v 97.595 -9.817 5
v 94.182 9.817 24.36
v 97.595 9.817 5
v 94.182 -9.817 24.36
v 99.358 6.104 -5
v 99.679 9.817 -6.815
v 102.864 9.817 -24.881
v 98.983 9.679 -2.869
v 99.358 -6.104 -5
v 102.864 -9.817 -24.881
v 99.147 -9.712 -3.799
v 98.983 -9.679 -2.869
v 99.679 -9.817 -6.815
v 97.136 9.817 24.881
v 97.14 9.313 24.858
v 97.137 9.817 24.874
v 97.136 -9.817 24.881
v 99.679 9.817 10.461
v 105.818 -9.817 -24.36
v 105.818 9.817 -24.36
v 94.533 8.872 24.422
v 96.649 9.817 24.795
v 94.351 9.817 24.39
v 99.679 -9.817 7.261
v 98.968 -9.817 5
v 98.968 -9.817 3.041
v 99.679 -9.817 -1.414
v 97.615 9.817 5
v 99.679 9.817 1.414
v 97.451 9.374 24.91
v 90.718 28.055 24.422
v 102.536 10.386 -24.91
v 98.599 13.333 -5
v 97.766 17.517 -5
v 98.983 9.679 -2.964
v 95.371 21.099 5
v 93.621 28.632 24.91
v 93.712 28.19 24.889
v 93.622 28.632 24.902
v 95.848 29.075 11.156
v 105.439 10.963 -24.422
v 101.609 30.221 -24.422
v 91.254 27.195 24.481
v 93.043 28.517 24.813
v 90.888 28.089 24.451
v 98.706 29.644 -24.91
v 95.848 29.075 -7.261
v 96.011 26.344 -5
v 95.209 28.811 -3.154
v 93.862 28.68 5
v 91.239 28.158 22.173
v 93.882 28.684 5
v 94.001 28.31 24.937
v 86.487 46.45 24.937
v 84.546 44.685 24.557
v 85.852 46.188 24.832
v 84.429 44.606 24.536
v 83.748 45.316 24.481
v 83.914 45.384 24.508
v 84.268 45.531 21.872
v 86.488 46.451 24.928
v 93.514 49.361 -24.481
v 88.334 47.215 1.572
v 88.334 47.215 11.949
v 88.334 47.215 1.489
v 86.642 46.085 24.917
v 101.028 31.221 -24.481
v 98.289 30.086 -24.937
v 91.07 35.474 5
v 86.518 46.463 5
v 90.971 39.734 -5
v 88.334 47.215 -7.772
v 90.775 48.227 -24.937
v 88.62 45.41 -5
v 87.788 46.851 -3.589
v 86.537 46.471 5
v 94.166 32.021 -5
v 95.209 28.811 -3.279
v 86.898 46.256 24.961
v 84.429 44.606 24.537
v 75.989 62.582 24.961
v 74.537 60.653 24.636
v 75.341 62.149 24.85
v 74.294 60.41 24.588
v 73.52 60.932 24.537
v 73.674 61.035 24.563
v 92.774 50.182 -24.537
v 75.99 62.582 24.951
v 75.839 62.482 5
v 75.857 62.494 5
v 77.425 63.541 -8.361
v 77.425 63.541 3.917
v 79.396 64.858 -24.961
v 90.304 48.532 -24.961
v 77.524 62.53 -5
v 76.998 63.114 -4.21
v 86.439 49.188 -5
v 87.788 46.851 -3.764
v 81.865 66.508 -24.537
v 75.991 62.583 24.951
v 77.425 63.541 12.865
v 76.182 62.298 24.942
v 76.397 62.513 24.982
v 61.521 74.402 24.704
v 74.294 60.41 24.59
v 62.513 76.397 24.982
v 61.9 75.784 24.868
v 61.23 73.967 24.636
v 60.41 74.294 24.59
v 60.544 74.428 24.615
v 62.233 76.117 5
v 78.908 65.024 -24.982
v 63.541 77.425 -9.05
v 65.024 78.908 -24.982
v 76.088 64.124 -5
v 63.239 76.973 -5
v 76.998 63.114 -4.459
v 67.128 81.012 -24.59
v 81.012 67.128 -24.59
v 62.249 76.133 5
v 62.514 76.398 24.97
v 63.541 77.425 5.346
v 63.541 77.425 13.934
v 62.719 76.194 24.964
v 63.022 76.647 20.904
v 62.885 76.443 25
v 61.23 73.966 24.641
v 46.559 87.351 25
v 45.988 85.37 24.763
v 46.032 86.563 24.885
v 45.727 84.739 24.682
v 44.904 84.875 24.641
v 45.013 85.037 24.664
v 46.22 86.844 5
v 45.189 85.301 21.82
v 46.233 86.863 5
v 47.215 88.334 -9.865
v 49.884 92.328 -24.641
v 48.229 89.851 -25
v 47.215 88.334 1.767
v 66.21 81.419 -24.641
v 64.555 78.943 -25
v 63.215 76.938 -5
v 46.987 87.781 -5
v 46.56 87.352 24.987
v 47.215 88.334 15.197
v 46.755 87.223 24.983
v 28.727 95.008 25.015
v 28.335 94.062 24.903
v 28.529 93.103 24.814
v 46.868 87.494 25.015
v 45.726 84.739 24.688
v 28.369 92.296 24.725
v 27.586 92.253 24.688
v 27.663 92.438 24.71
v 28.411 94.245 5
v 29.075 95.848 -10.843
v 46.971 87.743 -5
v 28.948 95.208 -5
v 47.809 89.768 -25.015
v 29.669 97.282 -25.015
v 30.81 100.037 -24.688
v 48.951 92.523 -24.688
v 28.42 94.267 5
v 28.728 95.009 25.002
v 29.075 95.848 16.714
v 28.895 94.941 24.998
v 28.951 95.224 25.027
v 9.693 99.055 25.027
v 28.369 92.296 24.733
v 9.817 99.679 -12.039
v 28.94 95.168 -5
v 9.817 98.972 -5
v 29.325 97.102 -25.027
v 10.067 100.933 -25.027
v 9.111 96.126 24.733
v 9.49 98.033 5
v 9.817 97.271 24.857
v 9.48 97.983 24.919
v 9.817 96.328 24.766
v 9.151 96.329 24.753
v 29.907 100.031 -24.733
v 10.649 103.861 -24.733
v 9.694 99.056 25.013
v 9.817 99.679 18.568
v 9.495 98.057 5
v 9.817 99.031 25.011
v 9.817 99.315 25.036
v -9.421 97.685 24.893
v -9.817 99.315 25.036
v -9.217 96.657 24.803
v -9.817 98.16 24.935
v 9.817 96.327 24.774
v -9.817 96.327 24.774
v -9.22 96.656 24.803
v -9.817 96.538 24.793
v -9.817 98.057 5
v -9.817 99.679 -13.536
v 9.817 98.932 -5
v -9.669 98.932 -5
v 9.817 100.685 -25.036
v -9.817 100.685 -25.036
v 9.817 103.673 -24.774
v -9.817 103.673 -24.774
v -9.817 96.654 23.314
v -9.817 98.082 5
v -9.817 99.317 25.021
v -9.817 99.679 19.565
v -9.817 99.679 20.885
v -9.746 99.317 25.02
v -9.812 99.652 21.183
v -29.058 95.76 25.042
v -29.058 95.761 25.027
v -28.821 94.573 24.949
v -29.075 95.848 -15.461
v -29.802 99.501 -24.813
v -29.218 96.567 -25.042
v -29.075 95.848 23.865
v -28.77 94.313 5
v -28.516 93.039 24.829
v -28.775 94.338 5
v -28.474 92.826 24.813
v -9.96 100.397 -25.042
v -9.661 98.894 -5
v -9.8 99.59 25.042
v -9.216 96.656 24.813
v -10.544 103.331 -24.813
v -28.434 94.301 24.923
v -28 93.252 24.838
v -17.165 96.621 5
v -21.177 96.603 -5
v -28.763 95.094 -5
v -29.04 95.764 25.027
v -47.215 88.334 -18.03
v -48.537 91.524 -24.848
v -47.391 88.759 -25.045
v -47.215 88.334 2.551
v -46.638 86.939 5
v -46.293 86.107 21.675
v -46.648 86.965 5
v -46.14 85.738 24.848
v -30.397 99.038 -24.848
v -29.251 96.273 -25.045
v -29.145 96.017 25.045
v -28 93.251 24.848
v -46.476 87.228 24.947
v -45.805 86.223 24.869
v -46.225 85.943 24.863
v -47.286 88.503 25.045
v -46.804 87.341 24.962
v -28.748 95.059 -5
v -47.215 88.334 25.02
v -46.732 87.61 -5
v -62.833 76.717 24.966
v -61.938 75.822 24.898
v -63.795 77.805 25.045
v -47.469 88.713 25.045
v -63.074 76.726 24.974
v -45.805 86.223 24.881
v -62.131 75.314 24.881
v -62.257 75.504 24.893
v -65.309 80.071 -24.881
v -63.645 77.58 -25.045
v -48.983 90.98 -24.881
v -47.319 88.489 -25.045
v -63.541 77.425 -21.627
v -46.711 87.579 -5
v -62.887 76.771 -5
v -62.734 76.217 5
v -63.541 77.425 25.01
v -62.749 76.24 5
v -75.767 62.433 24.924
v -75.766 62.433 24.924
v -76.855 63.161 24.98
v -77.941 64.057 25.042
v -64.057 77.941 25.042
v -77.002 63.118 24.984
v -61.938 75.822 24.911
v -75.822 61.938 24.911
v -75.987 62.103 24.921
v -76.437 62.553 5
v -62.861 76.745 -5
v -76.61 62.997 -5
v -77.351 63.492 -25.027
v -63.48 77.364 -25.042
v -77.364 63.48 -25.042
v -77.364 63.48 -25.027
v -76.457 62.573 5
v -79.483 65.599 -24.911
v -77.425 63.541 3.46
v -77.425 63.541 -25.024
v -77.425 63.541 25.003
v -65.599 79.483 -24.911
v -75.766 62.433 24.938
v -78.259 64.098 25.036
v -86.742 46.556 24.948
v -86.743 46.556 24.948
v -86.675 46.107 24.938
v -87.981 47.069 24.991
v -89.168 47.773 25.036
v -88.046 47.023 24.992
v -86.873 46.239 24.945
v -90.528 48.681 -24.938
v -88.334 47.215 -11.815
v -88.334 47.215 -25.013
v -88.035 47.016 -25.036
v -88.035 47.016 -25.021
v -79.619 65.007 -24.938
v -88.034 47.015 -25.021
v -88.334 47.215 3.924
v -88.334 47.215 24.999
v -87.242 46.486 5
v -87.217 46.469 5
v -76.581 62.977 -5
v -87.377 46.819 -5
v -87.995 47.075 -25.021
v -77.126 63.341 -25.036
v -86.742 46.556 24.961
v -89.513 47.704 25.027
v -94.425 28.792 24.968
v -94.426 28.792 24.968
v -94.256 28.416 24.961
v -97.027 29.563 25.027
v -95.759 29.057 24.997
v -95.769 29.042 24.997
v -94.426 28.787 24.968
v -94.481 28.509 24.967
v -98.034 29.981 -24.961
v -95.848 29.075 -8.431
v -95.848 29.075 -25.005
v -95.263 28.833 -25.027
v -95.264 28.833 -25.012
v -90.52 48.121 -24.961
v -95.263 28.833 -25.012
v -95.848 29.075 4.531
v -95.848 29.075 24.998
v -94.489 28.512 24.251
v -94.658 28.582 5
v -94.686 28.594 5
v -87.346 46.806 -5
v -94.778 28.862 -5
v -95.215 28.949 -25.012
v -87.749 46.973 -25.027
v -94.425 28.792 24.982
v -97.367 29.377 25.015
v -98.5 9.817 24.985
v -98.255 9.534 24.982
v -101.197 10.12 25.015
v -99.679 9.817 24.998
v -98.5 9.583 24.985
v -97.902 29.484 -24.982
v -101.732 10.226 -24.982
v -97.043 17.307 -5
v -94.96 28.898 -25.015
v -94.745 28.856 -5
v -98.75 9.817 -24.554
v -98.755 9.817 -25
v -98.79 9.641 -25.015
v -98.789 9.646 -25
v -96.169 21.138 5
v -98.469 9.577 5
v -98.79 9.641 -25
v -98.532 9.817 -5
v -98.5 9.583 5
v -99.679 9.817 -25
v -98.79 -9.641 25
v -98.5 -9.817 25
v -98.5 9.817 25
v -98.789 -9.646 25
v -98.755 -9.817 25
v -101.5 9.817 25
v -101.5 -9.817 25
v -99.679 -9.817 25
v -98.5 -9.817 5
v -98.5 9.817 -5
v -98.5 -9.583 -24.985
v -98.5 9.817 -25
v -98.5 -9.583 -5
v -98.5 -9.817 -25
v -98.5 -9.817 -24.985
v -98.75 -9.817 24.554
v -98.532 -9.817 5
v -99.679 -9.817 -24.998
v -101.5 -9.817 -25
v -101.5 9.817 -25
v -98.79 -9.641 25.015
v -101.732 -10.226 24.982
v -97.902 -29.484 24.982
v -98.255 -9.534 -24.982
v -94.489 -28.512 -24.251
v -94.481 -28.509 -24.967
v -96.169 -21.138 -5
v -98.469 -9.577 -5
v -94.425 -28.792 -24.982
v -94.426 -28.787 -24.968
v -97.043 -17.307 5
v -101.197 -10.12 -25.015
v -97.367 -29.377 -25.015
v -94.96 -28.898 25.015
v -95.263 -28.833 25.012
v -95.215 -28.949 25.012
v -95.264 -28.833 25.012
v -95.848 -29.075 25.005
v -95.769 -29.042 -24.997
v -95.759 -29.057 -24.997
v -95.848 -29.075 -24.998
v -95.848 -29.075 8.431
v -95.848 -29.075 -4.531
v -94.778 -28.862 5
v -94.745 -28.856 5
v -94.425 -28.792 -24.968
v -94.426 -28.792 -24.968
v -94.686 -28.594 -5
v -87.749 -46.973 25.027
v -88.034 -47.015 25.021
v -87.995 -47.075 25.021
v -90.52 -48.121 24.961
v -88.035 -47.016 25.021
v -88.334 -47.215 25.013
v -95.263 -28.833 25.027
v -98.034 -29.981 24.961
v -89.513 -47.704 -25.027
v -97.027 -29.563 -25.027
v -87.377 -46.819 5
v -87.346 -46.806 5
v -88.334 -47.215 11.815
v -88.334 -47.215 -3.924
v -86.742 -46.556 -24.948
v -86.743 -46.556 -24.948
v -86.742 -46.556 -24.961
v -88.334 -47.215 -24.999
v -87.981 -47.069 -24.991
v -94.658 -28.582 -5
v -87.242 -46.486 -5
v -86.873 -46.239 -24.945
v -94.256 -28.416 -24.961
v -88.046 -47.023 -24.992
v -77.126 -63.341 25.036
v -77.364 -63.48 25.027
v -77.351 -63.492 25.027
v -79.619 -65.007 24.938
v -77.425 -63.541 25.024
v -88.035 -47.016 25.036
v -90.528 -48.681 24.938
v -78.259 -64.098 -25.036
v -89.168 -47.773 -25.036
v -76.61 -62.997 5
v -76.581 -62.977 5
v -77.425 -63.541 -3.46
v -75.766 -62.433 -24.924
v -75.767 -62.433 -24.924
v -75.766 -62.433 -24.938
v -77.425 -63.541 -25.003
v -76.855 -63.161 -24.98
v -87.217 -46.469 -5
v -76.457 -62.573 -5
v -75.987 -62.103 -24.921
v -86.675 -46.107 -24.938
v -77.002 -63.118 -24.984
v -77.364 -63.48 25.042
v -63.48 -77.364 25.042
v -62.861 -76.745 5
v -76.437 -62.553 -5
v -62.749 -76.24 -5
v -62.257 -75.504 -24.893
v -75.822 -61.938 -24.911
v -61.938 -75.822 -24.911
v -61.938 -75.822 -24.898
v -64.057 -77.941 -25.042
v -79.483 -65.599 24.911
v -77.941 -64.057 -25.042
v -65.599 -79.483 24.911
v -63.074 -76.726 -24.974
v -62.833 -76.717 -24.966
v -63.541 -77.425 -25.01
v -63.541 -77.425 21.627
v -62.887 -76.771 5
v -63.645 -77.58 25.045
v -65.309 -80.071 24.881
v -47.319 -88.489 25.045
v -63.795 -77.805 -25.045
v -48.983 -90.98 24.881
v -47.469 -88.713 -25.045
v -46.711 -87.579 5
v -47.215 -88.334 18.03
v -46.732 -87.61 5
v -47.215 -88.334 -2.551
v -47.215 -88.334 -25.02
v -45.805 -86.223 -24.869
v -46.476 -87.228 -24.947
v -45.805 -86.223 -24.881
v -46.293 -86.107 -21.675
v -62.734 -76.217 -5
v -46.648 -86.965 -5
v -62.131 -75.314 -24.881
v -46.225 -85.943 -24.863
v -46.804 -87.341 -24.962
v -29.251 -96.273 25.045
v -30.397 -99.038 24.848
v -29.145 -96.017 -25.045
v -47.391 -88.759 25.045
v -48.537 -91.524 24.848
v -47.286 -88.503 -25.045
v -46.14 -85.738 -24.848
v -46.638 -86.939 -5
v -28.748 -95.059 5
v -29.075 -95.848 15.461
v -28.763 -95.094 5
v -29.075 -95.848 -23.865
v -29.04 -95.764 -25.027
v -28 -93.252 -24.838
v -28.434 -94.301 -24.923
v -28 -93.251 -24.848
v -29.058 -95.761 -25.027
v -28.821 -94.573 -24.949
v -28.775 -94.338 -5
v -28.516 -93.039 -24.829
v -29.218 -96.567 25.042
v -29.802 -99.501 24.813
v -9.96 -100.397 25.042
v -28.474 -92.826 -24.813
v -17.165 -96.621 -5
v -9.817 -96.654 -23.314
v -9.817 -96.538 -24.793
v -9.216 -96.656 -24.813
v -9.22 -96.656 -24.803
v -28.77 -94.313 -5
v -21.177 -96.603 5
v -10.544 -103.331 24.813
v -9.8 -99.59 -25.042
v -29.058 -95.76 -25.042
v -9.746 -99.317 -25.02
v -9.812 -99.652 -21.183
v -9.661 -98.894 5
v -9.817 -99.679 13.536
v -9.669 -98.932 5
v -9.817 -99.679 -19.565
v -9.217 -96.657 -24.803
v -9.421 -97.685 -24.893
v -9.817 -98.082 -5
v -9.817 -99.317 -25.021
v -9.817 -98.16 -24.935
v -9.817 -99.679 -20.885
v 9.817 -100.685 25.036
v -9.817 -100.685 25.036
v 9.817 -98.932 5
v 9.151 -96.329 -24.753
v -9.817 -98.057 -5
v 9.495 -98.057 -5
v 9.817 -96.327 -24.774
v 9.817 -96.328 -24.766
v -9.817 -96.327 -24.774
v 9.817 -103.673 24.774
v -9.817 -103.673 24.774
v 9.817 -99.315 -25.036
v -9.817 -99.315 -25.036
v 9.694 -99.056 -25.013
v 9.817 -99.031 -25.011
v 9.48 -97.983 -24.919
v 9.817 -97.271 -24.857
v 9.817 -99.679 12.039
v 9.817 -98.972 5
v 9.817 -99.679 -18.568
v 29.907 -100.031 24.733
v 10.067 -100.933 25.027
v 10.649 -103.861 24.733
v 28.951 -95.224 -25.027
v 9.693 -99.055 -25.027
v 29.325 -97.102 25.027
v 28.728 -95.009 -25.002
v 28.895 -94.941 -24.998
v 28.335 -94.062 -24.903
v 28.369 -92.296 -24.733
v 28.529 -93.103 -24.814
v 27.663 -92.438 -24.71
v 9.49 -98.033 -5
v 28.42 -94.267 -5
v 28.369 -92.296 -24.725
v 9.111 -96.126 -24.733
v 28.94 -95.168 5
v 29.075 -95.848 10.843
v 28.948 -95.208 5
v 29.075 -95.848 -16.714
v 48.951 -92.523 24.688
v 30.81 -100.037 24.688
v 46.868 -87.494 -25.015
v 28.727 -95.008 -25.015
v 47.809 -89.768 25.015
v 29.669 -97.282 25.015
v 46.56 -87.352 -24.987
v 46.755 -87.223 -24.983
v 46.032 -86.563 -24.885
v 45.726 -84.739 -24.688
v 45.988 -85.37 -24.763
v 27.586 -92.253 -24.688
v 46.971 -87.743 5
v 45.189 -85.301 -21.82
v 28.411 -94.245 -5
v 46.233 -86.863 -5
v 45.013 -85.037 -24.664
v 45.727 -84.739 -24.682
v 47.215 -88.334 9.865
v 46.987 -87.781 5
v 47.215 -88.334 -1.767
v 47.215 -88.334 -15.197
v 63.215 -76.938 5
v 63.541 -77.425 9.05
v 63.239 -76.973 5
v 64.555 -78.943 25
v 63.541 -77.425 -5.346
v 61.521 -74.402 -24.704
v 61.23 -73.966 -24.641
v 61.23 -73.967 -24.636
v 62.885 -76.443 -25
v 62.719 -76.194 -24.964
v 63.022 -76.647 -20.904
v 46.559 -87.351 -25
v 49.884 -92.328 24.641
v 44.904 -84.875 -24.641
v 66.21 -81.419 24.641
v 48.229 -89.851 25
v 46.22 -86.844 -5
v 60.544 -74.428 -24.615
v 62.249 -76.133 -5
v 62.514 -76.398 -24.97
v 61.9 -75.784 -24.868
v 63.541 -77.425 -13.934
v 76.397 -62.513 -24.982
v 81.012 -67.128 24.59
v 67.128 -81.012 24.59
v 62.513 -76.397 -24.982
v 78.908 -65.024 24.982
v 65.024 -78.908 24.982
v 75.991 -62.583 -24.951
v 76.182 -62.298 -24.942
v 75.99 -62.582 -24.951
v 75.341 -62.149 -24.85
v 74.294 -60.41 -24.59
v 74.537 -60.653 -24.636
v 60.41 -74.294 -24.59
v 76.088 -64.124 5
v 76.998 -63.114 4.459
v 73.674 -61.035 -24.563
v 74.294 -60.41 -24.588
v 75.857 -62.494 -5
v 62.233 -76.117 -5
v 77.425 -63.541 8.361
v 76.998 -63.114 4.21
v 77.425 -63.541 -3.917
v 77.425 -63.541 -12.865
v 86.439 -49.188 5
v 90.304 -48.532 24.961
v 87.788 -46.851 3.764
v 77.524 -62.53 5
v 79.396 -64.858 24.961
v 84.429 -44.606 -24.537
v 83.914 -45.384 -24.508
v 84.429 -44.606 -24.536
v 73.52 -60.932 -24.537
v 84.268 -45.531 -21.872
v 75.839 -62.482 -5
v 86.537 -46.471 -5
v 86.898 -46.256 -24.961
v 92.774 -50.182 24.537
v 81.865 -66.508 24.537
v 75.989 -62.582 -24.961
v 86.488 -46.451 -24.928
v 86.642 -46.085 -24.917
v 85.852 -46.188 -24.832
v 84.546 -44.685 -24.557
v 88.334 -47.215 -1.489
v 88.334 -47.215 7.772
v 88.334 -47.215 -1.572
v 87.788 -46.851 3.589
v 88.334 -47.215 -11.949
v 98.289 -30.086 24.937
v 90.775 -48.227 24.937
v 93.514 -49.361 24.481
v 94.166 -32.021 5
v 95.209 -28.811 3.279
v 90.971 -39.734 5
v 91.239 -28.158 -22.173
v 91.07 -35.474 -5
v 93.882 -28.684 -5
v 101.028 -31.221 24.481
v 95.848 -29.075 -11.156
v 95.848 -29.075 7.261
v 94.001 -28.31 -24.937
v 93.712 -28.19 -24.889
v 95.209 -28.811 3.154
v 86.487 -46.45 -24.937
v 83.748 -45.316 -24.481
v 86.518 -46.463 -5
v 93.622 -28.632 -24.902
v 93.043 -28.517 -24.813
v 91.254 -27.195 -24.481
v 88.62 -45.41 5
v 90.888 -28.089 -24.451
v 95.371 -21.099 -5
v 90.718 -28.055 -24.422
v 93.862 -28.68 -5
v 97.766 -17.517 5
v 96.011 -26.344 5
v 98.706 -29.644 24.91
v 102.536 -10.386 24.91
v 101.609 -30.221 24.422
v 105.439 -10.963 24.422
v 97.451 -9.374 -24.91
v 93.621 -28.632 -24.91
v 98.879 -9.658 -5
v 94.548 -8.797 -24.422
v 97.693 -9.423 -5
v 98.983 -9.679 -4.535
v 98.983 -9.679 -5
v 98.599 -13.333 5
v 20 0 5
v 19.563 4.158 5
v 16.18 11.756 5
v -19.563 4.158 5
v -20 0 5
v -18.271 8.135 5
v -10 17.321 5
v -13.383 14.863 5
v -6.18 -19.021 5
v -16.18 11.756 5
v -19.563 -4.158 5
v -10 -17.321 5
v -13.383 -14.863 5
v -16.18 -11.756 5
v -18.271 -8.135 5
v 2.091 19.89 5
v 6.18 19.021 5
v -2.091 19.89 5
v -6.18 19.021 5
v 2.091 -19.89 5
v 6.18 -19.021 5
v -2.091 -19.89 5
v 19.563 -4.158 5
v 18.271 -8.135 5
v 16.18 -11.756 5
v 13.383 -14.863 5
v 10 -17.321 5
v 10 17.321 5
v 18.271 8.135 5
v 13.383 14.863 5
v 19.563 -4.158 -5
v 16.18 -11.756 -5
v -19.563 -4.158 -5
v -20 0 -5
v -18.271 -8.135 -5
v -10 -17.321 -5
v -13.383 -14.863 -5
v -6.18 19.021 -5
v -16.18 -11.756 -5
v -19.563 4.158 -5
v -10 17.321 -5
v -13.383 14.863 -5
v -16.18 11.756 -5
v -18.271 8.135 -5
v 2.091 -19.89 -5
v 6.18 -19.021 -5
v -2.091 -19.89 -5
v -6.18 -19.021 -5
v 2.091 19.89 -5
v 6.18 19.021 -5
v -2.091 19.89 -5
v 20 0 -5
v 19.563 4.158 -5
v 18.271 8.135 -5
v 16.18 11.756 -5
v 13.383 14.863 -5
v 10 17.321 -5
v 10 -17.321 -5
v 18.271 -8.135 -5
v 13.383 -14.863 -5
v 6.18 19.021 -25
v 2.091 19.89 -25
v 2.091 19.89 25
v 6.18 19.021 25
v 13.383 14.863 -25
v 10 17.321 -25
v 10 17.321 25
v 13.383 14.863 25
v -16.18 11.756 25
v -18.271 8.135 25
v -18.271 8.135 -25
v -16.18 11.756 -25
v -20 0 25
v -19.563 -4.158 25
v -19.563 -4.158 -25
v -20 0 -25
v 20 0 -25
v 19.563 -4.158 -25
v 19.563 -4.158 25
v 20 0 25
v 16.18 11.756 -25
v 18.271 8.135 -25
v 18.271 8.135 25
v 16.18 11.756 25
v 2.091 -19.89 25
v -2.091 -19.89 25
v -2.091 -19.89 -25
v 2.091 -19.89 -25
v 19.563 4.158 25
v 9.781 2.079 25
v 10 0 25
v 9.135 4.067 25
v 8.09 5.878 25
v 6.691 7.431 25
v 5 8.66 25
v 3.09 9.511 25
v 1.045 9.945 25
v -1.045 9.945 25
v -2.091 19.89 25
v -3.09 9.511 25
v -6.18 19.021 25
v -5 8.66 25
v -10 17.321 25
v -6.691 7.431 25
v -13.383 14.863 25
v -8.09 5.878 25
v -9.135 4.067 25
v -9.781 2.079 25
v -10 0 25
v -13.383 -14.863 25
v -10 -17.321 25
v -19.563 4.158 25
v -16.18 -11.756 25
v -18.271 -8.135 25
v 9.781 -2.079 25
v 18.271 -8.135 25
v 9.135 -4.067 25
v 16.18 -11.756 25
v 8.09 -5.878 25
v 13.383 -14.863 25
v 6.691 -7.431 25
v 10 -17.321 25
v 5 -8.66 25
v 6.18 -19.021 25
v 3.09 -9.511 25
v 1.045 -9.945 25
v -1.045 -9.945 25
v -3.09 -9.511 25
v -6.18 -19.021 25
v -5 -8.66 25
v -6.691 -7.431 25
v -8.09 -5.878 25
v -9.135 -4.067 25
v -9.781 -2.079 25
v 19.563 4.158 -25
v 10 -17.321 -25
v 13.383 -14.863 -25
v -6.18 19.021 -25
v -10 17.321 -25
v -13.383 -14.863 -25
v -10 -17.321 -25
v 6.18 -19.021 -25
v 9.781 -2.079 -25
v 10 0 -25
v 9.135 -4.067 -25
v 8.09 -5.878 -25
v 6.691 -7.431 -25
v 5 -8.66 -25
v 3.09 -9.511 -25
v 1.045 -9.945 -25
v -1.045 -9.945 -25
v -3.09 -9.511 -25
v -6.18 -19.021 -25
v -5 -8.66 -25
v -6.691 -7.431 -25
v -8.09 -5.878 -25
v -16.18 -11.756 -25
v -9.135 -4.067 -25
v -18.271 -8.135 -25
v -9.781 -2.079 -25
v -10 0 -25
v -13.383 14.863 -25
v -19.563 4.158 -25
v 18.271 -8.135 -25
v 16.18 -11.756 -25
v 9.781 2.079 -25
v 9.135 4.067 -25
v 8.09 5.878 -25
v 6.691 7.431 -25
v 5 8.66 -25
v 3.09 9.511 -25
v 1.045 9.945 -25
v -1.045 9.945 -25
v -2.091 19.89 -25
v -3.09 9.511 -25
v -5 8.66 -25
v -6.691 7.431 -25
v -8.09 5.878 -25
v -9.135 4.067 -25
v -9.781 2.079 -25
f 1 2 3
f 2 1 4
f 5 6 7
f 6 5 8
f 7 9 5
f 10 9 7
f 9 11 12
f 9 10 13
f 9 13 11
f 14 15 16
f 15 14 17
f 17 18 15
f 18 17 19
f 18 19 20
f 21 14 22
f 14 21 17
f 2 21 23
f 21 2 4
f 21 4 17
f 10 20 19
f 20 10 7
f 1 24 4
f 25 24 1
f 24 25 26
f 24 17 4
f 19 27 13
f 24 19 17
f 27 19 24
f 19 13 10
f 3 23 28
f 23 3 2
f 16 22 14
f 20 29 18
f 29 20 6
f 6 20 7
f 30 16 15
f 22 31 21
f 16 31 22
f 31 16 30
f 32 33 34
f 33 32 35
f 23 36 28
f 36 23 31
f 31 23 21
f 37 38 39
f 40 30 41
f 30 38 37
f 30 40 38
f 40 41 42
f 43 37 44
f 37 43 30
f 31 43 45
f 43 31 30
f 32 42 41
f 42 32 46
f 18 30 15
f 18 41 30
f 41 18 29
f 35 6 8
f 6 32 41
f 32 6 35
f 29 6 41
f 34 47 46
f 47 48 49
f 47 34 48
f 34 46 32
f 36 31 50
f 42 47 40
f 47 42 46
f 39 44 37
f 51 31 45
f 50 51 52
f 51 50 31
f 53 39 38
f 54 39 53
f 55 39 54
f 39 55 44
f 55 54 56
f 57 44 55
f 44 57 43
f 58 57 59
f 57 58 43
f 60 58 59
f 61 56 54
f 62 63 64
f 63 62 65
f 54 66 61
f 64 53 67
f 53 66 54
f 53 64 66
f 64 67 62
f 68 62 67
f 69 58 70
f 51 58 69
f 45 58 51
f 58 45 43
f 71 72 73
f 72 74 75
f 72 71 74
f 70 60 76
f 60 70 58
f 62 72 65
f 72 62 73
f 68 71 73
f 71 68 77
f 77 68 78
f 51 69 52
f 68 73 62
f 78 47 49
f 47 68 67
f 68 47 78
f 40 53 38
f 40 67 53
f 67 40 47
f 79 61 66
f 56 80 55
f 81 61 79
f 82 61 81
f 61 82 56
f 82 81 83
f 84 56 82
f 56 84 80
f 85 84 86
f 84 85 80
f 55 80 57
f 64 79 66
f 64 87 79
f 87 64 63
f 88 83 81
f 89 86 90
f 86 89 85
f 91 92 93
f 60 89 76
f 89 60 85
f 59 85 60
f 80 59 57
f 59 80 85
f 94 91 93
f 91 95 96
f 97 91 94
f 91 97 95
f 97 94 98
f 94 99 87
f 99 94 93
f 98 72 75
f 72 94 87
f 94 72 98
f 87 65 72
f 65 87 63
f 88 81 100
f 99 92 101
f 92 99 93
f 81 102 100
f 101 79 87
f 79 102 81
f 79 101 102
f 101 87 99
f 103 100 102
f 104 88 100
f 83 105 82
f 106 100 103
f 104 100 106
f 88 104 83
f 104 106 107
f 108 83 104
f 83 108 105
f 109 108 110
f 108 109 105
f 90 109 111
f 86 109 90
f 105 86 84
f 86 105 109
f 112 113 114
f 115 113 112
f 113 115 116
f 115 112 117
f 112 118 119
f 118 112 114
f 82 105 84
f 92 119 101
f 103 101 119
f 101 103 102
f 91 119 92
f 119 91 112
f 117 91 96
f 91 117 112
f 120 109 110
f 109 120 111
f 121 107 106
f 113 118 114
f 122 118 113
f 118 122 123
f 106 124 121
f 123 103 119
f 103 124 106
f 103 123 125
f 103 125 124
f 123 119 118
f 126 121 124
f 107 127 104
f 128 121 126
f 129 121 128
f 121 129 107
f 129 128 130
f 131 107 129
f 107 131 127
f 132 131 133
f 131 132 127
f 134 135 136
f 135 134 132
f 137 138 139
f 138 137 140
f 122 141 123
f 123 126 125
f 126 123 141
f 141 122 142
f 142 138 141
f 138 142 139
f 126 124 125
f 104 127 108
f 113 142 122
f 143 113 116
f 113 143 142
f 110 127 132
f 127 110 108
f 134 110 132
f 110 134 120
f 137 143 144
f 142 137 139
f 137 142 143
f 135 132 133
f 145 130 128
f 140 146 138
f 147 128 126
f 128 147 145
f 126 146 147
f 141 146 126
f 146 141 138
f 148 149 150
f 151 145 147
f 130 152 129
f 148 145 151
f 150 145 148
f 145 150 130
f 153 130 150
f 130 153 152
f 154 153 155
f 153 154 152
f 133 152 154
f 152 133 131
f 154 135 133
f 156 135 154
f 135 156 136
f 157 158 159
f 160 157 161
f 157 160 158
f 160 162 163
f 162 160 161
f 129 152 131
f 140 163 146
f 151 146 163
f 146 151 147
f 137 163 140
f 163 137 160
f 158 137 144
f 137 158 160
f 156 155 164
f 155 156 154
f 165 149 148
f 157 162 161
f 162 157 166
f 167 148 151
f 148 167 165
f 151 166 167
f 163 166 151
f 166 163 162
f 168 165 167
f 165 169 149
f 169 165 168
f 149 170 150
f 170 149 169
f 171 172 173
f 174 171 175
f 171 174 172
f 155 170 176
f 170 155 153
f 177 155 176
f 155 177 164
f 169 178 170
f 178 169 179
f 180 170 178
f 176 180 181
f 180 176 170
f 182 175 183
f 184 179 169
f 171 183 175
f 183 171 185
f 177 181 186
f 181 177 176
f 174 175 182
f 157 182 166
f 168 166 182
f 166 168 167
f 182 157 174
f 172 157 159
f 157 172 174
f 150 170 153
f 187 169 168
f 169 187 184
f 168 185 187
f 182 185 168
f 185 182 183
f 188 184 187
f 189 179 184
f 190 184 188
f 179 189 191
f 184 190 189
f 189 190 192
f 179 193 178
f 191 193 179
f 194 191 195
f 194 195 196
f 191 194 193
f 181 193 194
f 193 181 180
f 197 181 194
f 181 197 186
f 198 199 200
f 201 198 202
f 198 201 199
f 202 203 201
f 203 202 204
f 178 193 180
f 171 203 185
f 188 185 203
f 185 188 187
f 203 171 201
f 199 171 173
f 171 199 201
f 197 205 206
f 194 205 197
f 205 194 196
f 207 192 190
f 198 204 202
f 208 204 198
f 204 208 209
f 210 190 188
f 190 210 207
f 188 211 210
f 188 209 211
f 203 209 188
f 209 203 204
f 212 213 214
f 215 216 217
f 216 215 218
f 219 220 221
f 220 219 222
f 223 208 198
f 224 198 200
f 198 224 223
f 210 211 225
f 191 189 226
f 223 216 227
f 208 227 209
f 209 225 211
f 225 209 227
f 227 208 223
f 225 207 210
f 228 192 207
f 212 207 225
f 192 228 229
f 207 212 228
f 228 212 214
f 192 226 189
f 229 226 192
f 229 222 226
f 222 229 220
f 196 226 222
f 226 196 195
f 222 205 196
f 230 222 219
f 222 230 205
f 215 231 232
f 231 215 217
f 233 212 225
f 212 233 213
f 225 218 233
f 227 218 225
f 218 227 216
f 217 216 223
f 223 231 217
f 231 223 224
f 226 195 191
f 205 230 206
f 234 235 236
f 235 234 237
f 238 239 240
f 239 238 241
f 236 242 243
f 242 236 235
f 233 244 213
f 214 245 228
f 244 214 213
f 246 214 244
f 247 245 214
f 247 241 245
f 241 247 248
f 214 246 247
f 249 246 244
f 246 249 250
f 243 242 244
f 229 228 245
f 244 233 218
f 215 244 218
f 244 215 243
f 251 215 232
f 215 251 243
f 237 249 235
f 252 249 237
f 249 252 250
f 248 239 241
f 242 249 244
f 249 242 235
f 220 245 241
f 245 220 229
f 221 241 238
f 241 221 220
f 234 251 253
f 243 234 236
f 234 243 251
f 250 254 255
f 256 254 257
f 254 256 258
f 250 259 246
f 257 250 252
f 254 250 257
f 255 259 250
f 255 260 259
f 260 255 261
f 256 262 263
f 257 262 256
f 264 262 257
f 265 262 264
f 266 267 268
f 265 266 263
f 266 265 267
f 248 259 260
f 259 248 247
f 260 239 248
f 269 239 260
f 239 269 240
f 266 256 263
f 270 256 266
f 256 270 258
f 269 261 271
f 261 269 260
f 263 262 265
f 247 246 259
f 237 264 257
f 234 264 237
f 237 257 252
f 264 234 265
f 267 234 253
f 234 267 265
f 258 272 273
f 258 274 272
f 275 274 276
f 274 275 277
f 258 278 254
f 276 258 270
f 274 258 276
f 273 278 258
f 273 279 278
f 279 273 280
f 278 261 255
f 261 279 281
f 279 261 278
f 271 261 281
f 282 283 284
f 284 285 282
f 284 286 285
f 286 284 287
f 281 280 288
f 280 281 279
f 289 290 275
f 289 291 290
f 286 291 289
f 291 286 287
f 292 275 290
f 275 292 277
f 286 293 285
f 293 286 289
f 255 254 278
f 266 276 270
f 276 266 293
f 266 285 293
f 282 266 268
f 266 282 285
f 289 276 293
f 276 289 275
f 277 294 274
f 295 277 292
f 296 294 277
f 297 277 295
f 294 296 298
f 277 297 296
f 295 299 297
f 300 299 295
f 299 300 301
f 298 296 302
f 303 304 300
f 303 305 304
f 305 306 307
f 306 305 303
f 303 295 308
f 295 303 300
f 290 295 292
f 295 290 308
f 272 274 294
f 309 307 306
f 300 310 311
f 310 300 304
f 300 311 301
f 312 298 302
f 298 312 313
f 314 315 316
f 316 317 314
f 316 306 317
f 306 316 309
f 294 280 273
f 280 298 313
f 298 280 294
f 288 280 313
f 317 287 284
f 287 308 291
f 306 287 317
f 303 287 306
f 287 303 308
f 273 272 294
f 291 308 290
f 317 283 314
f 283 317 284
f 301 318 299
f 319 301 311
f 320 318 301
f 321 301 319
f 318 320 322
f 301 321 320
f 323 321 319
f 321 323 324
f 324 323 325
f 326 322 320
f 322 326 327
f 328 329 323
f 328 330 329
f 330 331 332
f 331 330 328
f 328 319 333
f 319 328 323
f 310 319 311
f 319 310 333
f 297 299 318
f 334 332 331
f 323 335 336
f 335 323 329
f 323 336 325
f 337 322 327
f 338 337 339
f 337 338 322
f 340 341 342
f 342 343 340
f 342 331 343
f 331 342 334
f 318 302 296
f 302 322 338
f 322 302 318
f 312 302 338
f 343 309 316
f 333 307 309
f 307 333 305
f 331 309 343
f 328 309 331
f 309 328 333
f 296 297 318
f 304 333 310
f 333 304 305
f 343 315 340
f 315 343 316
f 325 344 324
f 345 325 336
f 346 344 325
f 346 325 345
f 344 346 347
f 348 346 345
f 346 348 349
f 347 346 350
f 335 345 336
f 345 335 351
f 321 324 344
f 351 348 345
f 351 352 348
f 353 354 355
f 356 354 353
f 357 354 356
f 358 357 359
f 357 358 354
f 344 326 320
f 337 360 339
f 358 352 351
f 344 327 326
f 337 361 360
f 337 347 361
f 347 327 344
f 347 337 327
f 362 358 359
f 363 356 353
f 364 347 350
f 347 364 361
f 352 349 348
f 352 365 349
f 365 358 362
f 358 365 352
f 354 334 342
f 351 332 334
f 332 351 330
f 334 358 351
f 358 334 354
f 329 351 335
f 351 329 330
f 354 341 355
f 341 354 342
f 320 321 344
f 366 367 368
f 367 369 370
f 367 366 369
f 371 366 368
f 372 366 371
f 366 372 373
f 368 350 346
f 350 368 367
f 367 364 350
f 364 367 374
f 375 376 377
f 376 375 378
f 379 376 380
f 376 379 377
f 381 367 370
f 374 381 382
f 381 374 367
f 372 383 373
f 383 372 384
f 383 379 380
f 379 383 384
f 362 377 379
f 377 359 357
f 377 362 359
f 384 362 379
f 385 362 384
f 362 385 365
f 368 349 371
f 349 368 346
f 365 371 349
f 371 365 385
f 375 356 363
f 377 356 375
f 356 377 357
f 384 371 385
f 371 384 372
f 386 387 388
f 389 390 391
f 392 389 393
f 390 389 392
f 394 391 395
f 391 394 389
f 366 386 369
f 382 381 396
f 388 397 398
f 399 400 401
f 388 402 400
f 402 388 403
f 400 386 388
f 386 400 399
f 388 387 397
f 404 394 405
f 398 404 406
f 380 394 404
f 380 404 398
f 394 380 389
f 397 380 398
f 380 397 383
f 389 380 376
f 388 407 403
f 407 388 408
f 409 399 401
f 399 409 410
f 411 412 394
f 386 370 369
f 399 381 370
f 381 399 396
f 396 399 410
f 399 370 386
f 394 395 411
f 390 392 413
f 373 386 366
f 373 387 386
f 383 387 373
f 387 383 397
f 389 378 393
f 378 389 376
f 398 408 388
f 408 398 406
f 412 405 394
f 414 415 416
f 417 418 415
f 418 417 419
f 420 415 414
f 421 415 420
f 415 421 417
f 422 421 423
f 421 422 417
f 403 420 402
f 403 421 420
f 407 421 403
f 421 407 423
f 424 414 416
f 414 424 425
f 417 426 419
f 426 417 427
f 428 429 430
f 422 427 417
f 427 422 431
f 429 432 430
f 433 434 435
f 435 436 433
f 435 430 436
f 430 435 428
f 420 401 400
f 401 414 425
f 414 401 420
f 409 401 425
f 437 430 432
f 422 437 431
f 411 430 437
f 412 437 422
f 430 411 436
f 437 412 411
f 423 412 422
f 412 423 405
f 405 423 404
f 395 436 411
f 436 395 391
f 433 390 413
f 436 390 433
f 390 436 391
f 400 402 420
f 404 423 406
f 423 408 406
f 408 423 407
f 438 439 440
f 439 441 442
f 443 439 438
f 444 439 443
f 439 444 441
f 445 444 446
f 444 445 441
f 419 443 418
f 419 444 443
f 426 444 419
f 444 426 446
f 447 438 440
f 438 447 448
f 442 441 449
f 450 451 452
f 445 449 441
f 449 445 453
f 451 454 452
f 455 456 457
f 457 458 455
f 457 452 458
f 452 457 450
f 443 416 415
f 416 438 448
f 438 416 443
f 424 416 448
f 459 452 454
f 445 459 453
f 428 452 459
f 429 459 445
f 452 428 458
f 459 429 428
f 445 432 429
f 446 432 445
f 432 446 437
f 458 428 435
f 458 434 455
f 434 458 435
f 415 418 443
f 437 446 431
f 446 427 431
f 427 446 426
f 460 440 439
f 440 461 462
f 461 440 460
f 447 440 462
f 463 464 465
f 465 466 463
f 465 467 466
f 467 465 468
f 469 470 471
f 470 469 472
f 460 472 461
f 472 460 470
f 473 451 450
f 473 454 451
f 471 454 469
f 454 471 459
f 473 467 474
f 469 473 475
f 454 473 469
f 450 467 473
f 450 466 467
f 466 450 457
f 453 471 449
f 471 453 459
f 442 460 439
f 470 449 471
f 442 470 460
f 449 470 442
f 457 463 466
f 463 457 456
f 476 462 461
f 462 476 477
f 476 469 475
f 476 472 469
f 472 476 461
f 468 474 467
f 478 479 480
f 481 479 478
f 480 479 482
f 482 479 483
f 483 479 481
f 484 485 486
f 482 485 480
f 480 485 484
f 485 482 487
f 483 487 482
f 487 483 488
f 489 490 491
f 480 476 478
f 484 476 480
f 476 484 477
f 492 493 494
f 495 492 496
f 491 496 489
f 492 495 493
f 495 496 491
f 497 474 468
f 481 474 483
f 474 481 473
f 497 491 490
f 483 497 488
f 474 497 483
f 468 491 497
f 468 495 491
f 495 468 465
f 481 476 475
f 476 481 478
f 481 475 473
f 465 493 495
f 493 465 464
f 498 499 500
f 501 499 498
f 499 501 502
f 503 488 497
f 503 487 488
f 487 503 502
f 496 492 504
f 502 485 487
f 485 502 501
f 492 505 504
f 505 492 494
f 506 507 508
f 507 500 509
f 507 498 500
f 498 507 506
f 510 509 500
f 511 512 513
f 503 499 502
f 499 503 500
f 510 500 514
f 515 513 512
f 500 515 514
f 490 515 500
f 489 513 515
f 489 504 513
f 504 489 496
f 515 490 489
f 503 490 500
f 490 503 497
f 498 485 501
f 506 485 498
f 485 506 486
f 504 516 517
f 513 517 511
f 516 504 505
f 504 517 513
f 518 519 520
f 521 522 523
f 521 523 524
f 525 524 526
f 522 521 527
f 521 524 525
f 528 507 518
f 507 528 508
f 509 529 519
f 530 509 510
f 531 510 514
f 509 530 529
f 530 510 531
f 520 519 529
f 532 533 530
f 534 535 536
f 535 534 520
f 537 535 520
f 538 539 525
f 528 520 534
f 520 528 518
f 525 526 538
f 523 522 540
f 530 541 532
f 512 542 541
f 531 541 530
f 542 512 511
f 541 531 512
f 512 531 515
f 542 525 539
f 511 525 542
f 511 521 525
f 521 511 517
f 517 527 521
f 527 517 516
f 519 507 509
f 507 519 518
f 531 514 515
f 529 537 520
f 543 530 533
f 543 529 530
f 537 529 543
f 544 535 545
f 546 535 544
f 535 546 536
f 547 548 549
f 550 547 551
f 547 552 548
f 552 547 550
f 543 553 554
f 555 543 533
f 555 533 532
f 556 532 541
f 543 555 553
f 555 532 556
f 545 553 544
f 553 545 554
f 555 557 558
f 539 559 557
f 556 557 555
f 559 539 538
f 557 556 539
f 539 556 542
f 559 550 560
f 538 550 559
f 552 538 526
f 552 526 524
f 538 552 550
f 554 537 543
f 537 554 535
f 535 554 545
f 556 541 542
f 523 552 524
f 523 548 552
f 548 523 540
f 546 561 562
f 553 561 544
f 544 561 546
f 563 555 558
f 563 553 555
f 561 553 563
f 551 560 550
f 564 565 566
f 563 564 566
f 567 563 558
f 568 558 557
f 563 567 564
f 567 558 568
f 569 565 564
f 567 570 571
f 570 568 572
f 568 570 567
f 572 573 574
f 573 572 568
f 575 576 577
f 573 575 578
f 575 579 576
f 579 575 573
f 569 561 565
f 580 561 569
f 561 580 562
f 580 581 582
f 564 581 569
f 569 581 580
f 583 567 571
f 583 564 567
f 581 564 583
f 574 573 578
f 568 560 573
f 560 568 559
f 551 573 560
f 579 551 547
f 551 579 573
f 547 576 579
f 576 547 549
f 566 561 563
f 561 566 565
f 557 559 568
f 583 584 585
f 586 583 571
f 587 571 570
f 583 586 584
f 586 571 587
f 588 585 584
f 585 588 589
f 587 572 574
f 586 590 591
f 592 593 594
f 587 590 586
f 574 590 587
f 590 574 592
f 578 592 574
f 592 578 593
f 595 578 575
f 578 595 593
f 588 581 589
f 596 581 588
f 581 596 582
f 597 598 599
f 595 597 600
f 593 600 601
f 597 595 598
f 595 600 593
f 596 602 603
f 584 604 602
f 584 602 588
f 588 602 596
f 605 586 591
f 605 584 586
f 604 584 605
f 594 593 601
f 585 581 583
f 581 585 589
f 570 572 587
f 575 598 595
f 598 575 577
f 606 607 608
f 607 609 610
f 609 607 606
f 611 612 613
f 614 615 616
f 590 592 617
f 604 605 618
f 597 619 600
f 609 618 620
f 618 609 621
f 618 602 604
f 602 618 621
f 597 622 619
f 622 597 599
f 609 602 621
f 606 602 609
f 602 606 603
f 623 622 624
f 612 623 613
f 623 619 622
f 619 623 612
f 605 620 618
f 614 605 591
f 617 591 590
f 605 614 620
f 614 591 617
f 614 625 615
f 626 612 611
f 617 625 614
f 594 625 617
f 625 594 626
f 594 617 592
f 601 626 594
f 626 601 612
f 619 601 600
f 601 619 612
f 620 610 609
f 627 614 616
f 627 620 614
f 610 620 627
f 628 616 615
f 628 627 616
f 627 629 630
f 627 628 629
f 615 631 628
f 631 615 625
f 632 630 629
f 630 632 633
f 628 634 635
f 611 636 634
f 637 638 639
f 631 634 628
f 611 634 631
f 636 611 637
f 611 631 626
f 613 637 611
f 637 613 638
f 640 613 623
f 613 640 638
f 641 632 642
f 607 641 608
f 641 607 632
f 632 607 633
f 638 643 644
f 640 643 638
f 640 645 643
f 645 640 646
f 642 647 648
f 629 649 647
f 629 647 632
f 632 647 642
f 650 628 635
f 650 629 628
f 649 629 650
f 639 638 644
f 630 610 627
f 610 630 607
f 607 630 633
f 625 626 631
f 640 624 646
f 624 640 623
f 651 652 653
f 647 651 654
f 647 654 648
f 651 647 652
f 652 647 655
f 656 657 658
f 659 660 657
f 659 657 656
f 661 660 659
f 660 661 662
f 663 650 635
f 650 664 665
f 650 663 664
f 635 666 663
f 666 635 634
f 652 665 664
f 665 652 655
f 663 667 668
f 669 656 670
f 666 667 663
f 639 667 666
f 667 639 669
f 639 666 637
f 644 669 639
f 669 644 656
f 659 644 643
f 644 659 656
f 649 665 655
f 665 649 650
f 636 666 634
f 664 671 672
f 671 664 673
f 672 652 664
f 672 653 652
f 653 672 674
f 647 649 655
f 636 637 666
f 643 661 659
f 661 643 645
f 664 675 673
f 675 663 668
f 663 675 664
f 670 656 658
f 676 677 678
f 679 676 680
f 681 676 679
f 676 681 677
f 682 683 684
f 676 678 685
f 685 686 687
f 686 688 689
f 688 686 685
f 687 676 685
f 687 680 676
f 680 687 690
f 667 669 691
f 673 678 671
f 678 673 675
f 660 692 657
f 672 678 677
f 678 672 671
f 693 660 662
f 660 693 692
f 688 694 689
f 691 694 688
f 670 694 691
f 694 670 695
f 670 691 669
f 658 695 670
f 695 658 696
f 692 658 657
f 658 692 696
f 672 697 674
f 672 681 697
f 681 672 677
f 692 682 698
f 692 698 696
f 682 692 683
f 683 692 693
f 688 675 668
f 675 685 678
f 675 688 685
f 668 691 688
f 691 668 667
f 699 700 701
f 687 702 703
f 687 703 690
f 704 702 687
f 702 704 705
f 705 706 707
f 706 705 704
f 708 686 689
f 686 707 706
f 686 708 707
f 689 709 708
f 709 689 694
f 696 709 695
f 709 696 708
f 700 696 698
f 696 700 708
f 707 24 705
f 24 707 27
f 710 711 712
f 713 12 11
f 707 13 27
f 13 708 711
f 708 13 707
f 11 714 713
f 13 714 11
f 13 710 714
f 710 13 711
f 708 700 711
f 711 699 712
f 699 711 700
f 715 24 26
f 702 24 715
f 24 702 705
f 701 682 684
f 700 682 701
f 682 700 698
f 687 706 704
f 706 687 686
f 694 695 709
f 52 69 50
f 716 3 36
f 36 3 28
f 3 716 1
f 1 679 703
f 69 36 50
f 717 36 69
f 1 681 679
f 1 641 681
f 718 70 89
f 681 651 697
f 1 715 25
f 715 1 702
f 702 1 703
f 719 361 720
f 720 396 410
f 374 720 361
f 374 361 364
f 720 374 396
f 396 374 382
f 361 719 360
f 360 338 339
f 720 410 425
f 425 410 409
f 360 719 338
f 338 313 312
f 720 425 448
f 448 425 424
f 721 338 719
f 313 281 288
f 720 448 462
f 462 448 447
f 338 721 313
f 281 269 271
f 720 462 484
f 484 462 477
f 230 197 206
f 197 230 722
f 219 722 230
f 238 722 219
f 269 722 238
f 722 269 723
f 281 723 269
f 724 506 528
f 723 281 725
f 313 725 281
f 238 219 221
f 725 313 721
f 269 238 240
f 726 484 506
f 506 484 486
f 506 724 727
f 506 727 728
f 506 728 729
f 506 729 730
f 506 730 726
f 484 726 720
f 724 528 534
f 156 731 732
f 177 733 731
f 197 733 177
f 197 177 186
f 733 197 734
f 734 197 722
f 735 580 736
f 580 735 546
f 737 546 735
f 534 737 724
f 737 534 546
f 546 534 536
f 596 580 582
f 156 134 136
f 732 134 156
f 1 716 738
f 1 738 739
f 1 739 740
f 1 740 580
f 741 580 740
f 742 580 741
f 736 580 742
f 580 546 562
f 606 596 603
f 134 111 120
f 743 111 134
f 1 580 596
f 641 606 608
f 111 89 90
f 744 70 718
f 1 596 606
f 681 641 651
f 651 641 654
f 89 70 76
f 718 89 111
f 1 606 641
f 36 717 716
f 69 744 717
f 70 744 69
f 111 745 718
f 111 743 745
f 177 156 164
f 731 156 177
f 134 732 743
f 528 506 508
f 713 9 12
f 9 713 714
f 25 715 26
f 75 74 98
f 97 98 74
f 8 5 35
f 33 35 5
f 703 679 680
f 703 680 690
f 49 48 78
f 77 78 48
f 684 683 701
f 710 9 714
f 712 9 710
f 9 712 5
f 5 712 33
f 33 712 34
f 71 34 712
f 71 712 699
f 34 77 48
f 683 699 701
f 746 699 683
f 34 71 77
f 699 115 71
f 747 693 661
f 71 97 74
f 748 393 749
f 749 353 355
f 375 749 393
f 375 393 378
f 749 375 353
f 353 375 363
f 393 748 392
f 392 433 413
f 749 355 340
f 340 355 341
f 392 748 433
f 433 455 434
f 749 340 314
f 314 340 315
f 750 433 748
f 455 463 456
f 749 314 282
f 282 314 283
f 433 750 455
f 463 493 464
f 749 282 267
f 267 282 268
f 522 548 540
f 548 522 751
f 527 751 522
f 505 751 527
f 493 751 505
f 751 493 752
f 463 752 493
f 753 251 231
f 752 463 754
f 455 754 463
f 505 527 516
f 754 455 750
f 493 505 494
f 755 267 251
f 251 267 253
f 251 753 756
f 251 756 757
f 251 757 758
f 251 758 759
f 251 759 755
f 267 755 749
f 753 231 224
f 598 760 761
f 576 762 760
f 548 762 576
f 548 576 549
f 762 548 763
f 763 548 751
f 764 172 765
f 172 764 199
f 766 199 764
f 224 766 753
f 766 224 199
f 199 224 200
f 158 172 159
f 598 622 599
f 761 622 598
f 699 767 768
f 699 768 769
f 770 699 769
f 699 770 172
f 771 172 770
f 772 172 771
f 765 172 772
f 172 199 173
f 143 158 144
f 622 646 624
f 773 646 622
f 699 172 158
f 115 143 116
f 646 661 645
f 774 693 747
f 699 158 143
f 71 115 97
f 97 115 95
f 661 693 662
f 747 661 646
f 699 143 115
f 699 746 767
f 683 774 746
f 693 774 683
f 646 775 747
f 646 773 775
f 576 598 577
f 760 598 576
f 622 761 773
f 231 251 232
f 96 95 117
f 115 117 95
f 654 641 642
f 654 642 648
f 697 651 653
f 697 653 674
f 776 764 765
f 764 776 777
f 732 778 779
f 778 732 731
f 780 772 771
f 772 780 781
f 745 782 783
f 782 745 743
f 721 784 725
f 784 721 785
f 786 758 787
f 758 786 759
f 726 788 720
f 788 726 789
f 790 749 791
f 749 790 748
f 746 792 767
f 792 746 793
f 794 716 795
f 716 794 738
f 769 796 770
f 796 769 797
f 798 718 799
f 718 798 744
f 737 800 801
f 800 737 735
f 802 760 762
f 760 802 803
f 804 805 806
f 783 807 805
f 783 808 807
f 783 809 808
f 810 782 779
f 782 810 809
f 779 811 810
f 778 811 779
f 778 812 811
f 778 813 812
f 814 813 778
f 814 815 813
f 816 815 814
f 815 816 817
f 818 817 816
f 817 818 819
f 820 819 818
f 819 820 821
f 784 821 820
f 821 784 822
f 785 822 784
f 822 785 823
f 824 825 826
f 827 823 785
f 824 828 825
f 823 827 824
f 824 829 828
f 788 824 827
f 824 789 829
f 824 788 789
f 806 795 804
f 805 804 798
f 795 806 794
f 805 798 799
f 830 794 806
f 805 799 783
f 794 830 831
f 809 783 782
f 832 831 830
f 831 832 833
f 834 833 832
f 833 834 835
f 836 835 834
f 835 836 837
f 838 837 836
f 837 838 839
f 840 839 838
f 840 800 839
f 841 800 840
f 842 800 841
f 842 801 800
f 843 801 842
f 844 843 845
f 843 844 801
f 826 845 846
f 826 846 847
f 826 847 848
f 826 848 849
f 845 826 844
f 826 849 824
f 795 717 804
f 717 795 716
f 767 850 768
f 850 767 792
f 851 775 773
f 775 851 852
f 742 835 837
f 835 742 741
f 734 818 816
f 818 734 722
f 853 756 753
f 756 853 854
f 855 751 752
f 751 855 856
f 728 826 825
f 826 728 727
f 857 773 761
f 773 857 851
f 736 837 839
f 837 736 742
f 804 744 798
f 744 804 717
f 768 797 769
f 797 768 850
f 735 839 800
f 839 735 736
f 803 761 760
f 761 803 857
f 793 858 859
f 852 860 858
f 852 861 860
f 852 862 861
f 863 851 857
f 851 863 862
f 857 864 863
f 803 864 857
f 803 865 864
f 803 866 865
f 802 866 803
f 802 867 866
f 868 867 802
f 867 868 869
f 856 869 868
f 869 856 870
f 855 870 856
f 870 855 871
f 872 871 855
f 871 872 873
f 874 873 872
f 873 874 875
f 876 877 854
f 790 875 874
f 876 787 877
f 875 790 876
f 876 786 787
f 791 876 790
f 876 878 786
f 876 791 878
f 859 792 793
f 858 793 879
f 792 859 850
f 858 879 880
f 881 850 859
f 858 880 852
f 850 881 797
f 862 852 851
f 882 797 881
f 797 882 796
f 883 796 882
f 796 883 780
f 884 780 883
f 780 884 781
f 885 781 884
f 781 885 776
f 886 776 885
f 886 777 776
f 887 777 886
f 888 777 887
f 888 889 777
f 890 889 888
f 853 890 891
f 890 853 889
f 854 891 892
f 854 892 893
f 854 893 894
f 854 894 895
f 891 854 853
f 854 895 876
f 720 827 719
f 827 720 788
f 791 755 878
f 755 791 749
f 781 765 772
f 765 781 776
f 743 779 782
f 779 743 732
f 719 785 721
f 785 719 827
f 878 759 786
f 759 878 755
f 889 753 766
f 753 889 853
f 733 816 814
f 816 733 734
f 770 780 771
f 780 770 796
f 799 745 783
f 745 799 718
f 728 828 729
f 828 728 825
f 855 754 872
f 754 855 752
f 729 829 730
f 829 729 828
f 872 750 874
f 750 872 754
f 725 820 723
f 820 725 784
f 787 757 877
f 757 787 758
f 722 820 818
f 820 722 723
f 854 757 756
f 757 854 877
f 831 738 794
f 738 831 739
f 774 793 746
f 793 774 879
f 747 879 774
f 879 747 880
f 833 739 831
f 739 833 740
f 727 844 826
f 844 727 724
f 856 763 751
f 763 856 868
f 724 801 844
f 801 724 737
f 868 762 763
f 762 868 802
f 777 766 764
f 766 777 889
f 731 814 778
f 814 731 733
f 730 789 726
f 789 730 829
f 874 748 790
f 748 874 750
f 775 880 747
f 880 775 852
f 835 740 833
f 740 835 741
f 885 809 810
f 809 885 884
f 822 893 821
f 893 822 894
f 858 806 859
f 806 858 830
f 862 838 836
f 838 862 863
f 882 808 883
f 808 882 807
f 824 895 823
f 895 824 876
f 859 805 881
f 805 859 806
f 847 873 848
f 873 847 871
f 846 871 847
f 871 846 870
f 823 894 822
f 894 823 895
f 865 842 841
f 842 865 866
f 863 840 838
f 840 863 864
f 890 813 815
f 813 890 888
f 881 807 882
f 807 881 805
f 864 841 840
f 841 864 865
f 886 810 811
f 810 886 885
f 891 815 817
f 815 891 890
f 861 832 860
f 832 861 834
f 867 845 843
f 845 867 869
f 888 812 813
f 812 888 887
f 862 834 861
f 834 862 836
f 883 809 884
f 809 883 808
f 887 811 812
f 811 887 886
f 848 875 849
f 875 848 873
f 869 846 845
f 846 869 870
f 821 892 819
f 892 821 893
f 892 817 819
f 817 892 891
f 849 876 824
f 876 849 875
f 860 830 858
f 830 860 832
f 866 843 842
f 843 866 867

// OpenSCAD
/*
Mirror drum generator for mechanical TV
Jenny List 2026
CC-BY-SA 4.0

Rotation is clockwise

*/

//TV standard. Baird=30, nbtv.org=32
scanlines = 32;
//diameter of drum
diameter = 200;
//Drum height
height = 50;
// mirror tilt parameters. YOU WILL NEED TO ADJUST THESE, THE DEFAULTS ARE PICKED TO MAKE THE TILT OBVIOUS AND ARE FAR TOO BIG!
tiltstart = -10; //Starts at -10 degrees
tiltrange = 20; //Tilt range spans 20 degrees, to +10 degrees

drumradius = diameter/2;
degreesperdot = 360/scanlines;
tilt = tiltstart;
tiltstep = tiltrange/360;
mirrorheight = height;
mirrorwidth =(PI*diameter)/scanlines;
    
//Draw mirror mounts
for (alpha =[0:degreesperdot:360-degreesperdot]){ //end early for field sync
    translate([drumradius * cos(alpha), drumradius * sin(alpha)]) rotate([0,(tiltstep*alpha)+tiltstart,alpha]) cube([3,mirrorwidth,mirrorheight],true);
}

//Draw central spindle
difference(){
    union(){
        cylinder(10,drumradius,drumradius,true);   
        cylinder(height,20,20,true);
    }
    cylinder(height,10,10,true);
}
